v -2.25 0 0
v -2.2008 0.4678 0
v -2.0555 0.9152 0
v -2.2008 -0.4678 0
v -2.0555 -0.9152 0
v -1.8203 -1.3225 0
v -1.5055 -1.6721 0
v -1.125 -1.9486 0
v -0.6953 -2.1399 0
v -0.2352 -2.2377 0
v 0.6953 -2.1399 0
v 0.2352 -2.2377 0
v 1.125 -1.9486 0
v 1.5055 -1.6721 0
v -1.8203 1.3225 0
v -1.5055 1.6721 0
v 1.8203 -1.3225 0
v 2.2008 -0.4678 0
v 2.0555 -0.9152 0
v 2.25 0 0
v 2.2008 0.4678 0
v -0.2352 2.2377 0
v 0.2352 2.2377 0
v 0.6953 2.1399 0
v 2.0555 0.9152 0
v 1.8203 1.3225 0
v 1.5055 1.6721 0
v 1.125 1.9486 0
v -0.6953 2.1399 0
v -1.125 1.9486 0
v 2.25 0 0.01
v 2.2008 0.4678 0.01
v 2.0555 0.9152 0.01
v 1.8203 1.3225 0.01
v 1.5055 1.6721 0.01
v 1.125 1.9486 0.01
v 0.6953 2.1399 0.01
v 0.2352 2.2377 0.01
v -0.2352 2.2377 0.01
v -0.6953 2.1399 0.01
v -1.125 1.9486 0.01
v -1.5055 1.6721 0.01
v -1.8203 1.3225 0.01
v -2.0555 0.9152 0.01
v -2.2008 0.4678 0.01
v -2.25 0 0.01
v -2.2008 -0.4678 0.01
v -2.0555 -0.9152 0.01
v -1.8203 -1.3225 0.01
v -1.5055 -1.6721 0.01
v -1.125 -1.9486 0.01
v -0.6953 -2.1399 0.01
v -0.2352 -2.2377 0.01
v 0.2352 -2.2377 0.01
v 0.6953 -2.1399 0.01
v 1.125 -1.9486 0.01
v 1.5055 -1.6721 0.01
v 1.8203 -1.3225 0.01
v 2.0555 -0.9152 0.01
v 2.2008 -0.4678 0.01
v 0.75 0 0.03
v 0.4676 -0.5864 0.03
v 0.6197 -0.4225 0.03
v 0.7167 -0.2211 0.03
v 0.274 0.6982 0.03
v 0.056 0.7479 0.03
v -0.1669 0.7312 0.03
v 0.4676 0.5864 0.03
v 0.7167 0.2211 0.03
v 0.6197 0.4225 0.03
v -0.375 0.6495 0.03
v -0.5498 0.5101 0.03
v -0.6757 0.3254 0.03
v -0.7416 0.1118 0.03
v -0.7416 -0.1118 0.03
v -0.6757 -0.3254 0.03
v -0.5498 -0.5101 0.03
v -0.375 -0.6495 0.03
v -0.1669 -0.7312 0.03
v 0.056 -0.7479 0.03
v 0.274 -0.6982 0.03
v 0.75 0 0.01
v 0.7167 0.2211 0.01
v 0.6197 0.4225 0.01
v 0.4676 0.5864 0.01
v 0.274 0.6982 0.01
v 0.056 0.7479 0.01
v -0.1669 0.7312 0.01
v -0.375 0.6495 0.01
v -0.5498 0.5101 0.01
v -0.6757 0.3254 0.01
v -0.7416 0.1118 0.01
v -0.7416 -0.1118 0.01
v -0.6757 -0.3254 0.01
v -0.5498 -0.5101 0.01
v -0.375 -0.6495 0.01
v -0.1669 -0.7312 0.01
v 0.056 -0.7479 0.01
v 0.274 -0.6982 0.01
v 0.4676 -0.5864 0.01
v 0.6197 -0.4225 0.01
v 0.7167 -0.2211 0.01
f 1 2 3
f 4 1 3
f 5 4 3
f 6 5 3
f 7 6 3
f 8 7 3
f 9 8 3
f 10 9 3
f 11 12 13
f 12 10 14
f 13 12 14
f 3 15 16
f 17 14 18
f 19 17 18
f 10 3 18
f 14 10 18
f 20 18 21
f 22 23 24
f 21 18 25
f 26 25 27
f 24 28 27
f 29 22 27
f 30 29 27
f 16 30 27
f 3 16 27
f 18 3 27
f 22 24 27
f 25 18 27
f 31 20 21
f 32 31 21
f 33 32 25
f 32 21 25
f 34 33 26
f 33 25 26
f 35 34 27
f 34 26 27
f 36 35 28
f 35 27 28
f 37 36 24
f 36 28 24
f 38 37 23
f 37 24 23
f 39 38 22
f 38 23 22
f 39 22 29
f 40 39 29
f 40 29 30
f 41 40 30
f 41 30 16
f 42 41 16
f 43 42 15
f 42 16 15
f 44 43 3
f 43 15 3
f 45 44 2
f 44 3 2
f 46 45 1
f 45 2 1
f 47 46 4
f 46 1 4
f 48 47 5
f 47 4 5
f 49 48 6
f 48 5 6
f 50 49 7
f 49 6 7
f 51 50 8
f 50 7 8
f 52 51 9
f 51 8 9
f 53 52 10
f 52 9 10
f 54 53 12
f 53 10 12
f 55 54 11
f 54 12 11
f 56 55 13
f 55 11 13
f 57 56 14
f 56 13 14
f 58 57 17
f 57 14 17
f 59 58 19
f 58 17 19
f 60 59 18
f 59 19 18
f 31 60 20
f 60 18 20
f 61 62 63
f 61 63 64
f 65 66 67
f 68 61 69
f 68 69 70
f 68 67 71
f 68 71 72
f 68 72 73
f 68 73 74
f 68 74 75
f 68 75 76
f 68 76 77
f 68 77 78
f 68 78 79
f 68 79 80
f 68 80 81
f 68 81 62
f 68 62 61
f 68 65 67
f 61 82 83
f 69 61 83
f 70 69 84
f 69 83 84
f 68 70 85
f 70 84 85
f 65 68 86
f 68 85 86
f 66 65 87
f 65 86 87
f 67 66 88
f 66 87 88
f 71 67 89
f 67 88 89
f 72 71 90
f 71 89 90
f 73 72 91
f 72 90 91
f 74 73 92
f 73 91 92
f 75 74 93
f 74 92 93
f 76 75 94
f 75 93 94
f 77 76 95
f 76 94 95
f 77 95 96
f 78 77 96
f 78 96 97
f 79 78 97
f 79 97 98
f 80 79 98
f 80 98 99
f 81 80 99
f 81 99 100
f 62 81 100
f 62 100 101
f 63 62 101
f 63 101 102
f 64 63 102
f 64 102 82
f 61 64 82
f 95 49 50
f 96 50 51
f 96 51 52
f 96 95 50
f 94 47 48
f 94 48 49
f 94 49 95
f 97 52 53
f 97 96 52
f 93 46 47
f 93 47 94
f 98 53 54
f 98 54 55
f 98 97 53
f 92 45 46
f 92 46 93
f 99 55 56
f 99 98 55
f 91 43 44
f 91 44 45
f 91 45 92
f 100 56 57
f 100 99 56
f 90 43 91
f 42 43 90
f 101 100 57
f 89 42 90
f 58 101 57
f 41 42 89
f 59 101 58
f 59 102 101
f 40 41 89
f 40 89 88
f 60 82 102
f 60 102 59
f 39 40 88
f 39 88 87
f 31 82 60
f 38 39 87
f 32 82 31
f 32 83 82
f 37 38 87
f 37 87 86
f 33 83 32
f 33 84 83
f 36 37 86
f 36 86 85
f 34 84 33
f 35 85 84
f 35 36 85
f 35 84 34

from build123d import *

# Parameters (mm, degrees)
CYLINDER001_R     = 2.25
CYLINDER001_DEPTH = 0.01
CYLINDER_R        = 0.75
CYLINDER_DEPTH    = 0.03


with BuildPart() as cylinder001:
    # Cylinder001 → Cylinder001 (new body)
    with BuildSketch(Plane.XY):
        Circle(CYLINDER001_R)
    extrude(amount=CYLINDER001_DEPTH)


with BuildPart() as fid150x450round:
    # Cylinder → Cylinder (new body)
    with BuildSketch(Plane.XY):
        Circle(CYLINDER_R)
    extrude(amount=CYLINDER_DEPTH)

    # Fusion: union Cylinder001
    add(cylinder001.part)


solid = fid150x450round.part
